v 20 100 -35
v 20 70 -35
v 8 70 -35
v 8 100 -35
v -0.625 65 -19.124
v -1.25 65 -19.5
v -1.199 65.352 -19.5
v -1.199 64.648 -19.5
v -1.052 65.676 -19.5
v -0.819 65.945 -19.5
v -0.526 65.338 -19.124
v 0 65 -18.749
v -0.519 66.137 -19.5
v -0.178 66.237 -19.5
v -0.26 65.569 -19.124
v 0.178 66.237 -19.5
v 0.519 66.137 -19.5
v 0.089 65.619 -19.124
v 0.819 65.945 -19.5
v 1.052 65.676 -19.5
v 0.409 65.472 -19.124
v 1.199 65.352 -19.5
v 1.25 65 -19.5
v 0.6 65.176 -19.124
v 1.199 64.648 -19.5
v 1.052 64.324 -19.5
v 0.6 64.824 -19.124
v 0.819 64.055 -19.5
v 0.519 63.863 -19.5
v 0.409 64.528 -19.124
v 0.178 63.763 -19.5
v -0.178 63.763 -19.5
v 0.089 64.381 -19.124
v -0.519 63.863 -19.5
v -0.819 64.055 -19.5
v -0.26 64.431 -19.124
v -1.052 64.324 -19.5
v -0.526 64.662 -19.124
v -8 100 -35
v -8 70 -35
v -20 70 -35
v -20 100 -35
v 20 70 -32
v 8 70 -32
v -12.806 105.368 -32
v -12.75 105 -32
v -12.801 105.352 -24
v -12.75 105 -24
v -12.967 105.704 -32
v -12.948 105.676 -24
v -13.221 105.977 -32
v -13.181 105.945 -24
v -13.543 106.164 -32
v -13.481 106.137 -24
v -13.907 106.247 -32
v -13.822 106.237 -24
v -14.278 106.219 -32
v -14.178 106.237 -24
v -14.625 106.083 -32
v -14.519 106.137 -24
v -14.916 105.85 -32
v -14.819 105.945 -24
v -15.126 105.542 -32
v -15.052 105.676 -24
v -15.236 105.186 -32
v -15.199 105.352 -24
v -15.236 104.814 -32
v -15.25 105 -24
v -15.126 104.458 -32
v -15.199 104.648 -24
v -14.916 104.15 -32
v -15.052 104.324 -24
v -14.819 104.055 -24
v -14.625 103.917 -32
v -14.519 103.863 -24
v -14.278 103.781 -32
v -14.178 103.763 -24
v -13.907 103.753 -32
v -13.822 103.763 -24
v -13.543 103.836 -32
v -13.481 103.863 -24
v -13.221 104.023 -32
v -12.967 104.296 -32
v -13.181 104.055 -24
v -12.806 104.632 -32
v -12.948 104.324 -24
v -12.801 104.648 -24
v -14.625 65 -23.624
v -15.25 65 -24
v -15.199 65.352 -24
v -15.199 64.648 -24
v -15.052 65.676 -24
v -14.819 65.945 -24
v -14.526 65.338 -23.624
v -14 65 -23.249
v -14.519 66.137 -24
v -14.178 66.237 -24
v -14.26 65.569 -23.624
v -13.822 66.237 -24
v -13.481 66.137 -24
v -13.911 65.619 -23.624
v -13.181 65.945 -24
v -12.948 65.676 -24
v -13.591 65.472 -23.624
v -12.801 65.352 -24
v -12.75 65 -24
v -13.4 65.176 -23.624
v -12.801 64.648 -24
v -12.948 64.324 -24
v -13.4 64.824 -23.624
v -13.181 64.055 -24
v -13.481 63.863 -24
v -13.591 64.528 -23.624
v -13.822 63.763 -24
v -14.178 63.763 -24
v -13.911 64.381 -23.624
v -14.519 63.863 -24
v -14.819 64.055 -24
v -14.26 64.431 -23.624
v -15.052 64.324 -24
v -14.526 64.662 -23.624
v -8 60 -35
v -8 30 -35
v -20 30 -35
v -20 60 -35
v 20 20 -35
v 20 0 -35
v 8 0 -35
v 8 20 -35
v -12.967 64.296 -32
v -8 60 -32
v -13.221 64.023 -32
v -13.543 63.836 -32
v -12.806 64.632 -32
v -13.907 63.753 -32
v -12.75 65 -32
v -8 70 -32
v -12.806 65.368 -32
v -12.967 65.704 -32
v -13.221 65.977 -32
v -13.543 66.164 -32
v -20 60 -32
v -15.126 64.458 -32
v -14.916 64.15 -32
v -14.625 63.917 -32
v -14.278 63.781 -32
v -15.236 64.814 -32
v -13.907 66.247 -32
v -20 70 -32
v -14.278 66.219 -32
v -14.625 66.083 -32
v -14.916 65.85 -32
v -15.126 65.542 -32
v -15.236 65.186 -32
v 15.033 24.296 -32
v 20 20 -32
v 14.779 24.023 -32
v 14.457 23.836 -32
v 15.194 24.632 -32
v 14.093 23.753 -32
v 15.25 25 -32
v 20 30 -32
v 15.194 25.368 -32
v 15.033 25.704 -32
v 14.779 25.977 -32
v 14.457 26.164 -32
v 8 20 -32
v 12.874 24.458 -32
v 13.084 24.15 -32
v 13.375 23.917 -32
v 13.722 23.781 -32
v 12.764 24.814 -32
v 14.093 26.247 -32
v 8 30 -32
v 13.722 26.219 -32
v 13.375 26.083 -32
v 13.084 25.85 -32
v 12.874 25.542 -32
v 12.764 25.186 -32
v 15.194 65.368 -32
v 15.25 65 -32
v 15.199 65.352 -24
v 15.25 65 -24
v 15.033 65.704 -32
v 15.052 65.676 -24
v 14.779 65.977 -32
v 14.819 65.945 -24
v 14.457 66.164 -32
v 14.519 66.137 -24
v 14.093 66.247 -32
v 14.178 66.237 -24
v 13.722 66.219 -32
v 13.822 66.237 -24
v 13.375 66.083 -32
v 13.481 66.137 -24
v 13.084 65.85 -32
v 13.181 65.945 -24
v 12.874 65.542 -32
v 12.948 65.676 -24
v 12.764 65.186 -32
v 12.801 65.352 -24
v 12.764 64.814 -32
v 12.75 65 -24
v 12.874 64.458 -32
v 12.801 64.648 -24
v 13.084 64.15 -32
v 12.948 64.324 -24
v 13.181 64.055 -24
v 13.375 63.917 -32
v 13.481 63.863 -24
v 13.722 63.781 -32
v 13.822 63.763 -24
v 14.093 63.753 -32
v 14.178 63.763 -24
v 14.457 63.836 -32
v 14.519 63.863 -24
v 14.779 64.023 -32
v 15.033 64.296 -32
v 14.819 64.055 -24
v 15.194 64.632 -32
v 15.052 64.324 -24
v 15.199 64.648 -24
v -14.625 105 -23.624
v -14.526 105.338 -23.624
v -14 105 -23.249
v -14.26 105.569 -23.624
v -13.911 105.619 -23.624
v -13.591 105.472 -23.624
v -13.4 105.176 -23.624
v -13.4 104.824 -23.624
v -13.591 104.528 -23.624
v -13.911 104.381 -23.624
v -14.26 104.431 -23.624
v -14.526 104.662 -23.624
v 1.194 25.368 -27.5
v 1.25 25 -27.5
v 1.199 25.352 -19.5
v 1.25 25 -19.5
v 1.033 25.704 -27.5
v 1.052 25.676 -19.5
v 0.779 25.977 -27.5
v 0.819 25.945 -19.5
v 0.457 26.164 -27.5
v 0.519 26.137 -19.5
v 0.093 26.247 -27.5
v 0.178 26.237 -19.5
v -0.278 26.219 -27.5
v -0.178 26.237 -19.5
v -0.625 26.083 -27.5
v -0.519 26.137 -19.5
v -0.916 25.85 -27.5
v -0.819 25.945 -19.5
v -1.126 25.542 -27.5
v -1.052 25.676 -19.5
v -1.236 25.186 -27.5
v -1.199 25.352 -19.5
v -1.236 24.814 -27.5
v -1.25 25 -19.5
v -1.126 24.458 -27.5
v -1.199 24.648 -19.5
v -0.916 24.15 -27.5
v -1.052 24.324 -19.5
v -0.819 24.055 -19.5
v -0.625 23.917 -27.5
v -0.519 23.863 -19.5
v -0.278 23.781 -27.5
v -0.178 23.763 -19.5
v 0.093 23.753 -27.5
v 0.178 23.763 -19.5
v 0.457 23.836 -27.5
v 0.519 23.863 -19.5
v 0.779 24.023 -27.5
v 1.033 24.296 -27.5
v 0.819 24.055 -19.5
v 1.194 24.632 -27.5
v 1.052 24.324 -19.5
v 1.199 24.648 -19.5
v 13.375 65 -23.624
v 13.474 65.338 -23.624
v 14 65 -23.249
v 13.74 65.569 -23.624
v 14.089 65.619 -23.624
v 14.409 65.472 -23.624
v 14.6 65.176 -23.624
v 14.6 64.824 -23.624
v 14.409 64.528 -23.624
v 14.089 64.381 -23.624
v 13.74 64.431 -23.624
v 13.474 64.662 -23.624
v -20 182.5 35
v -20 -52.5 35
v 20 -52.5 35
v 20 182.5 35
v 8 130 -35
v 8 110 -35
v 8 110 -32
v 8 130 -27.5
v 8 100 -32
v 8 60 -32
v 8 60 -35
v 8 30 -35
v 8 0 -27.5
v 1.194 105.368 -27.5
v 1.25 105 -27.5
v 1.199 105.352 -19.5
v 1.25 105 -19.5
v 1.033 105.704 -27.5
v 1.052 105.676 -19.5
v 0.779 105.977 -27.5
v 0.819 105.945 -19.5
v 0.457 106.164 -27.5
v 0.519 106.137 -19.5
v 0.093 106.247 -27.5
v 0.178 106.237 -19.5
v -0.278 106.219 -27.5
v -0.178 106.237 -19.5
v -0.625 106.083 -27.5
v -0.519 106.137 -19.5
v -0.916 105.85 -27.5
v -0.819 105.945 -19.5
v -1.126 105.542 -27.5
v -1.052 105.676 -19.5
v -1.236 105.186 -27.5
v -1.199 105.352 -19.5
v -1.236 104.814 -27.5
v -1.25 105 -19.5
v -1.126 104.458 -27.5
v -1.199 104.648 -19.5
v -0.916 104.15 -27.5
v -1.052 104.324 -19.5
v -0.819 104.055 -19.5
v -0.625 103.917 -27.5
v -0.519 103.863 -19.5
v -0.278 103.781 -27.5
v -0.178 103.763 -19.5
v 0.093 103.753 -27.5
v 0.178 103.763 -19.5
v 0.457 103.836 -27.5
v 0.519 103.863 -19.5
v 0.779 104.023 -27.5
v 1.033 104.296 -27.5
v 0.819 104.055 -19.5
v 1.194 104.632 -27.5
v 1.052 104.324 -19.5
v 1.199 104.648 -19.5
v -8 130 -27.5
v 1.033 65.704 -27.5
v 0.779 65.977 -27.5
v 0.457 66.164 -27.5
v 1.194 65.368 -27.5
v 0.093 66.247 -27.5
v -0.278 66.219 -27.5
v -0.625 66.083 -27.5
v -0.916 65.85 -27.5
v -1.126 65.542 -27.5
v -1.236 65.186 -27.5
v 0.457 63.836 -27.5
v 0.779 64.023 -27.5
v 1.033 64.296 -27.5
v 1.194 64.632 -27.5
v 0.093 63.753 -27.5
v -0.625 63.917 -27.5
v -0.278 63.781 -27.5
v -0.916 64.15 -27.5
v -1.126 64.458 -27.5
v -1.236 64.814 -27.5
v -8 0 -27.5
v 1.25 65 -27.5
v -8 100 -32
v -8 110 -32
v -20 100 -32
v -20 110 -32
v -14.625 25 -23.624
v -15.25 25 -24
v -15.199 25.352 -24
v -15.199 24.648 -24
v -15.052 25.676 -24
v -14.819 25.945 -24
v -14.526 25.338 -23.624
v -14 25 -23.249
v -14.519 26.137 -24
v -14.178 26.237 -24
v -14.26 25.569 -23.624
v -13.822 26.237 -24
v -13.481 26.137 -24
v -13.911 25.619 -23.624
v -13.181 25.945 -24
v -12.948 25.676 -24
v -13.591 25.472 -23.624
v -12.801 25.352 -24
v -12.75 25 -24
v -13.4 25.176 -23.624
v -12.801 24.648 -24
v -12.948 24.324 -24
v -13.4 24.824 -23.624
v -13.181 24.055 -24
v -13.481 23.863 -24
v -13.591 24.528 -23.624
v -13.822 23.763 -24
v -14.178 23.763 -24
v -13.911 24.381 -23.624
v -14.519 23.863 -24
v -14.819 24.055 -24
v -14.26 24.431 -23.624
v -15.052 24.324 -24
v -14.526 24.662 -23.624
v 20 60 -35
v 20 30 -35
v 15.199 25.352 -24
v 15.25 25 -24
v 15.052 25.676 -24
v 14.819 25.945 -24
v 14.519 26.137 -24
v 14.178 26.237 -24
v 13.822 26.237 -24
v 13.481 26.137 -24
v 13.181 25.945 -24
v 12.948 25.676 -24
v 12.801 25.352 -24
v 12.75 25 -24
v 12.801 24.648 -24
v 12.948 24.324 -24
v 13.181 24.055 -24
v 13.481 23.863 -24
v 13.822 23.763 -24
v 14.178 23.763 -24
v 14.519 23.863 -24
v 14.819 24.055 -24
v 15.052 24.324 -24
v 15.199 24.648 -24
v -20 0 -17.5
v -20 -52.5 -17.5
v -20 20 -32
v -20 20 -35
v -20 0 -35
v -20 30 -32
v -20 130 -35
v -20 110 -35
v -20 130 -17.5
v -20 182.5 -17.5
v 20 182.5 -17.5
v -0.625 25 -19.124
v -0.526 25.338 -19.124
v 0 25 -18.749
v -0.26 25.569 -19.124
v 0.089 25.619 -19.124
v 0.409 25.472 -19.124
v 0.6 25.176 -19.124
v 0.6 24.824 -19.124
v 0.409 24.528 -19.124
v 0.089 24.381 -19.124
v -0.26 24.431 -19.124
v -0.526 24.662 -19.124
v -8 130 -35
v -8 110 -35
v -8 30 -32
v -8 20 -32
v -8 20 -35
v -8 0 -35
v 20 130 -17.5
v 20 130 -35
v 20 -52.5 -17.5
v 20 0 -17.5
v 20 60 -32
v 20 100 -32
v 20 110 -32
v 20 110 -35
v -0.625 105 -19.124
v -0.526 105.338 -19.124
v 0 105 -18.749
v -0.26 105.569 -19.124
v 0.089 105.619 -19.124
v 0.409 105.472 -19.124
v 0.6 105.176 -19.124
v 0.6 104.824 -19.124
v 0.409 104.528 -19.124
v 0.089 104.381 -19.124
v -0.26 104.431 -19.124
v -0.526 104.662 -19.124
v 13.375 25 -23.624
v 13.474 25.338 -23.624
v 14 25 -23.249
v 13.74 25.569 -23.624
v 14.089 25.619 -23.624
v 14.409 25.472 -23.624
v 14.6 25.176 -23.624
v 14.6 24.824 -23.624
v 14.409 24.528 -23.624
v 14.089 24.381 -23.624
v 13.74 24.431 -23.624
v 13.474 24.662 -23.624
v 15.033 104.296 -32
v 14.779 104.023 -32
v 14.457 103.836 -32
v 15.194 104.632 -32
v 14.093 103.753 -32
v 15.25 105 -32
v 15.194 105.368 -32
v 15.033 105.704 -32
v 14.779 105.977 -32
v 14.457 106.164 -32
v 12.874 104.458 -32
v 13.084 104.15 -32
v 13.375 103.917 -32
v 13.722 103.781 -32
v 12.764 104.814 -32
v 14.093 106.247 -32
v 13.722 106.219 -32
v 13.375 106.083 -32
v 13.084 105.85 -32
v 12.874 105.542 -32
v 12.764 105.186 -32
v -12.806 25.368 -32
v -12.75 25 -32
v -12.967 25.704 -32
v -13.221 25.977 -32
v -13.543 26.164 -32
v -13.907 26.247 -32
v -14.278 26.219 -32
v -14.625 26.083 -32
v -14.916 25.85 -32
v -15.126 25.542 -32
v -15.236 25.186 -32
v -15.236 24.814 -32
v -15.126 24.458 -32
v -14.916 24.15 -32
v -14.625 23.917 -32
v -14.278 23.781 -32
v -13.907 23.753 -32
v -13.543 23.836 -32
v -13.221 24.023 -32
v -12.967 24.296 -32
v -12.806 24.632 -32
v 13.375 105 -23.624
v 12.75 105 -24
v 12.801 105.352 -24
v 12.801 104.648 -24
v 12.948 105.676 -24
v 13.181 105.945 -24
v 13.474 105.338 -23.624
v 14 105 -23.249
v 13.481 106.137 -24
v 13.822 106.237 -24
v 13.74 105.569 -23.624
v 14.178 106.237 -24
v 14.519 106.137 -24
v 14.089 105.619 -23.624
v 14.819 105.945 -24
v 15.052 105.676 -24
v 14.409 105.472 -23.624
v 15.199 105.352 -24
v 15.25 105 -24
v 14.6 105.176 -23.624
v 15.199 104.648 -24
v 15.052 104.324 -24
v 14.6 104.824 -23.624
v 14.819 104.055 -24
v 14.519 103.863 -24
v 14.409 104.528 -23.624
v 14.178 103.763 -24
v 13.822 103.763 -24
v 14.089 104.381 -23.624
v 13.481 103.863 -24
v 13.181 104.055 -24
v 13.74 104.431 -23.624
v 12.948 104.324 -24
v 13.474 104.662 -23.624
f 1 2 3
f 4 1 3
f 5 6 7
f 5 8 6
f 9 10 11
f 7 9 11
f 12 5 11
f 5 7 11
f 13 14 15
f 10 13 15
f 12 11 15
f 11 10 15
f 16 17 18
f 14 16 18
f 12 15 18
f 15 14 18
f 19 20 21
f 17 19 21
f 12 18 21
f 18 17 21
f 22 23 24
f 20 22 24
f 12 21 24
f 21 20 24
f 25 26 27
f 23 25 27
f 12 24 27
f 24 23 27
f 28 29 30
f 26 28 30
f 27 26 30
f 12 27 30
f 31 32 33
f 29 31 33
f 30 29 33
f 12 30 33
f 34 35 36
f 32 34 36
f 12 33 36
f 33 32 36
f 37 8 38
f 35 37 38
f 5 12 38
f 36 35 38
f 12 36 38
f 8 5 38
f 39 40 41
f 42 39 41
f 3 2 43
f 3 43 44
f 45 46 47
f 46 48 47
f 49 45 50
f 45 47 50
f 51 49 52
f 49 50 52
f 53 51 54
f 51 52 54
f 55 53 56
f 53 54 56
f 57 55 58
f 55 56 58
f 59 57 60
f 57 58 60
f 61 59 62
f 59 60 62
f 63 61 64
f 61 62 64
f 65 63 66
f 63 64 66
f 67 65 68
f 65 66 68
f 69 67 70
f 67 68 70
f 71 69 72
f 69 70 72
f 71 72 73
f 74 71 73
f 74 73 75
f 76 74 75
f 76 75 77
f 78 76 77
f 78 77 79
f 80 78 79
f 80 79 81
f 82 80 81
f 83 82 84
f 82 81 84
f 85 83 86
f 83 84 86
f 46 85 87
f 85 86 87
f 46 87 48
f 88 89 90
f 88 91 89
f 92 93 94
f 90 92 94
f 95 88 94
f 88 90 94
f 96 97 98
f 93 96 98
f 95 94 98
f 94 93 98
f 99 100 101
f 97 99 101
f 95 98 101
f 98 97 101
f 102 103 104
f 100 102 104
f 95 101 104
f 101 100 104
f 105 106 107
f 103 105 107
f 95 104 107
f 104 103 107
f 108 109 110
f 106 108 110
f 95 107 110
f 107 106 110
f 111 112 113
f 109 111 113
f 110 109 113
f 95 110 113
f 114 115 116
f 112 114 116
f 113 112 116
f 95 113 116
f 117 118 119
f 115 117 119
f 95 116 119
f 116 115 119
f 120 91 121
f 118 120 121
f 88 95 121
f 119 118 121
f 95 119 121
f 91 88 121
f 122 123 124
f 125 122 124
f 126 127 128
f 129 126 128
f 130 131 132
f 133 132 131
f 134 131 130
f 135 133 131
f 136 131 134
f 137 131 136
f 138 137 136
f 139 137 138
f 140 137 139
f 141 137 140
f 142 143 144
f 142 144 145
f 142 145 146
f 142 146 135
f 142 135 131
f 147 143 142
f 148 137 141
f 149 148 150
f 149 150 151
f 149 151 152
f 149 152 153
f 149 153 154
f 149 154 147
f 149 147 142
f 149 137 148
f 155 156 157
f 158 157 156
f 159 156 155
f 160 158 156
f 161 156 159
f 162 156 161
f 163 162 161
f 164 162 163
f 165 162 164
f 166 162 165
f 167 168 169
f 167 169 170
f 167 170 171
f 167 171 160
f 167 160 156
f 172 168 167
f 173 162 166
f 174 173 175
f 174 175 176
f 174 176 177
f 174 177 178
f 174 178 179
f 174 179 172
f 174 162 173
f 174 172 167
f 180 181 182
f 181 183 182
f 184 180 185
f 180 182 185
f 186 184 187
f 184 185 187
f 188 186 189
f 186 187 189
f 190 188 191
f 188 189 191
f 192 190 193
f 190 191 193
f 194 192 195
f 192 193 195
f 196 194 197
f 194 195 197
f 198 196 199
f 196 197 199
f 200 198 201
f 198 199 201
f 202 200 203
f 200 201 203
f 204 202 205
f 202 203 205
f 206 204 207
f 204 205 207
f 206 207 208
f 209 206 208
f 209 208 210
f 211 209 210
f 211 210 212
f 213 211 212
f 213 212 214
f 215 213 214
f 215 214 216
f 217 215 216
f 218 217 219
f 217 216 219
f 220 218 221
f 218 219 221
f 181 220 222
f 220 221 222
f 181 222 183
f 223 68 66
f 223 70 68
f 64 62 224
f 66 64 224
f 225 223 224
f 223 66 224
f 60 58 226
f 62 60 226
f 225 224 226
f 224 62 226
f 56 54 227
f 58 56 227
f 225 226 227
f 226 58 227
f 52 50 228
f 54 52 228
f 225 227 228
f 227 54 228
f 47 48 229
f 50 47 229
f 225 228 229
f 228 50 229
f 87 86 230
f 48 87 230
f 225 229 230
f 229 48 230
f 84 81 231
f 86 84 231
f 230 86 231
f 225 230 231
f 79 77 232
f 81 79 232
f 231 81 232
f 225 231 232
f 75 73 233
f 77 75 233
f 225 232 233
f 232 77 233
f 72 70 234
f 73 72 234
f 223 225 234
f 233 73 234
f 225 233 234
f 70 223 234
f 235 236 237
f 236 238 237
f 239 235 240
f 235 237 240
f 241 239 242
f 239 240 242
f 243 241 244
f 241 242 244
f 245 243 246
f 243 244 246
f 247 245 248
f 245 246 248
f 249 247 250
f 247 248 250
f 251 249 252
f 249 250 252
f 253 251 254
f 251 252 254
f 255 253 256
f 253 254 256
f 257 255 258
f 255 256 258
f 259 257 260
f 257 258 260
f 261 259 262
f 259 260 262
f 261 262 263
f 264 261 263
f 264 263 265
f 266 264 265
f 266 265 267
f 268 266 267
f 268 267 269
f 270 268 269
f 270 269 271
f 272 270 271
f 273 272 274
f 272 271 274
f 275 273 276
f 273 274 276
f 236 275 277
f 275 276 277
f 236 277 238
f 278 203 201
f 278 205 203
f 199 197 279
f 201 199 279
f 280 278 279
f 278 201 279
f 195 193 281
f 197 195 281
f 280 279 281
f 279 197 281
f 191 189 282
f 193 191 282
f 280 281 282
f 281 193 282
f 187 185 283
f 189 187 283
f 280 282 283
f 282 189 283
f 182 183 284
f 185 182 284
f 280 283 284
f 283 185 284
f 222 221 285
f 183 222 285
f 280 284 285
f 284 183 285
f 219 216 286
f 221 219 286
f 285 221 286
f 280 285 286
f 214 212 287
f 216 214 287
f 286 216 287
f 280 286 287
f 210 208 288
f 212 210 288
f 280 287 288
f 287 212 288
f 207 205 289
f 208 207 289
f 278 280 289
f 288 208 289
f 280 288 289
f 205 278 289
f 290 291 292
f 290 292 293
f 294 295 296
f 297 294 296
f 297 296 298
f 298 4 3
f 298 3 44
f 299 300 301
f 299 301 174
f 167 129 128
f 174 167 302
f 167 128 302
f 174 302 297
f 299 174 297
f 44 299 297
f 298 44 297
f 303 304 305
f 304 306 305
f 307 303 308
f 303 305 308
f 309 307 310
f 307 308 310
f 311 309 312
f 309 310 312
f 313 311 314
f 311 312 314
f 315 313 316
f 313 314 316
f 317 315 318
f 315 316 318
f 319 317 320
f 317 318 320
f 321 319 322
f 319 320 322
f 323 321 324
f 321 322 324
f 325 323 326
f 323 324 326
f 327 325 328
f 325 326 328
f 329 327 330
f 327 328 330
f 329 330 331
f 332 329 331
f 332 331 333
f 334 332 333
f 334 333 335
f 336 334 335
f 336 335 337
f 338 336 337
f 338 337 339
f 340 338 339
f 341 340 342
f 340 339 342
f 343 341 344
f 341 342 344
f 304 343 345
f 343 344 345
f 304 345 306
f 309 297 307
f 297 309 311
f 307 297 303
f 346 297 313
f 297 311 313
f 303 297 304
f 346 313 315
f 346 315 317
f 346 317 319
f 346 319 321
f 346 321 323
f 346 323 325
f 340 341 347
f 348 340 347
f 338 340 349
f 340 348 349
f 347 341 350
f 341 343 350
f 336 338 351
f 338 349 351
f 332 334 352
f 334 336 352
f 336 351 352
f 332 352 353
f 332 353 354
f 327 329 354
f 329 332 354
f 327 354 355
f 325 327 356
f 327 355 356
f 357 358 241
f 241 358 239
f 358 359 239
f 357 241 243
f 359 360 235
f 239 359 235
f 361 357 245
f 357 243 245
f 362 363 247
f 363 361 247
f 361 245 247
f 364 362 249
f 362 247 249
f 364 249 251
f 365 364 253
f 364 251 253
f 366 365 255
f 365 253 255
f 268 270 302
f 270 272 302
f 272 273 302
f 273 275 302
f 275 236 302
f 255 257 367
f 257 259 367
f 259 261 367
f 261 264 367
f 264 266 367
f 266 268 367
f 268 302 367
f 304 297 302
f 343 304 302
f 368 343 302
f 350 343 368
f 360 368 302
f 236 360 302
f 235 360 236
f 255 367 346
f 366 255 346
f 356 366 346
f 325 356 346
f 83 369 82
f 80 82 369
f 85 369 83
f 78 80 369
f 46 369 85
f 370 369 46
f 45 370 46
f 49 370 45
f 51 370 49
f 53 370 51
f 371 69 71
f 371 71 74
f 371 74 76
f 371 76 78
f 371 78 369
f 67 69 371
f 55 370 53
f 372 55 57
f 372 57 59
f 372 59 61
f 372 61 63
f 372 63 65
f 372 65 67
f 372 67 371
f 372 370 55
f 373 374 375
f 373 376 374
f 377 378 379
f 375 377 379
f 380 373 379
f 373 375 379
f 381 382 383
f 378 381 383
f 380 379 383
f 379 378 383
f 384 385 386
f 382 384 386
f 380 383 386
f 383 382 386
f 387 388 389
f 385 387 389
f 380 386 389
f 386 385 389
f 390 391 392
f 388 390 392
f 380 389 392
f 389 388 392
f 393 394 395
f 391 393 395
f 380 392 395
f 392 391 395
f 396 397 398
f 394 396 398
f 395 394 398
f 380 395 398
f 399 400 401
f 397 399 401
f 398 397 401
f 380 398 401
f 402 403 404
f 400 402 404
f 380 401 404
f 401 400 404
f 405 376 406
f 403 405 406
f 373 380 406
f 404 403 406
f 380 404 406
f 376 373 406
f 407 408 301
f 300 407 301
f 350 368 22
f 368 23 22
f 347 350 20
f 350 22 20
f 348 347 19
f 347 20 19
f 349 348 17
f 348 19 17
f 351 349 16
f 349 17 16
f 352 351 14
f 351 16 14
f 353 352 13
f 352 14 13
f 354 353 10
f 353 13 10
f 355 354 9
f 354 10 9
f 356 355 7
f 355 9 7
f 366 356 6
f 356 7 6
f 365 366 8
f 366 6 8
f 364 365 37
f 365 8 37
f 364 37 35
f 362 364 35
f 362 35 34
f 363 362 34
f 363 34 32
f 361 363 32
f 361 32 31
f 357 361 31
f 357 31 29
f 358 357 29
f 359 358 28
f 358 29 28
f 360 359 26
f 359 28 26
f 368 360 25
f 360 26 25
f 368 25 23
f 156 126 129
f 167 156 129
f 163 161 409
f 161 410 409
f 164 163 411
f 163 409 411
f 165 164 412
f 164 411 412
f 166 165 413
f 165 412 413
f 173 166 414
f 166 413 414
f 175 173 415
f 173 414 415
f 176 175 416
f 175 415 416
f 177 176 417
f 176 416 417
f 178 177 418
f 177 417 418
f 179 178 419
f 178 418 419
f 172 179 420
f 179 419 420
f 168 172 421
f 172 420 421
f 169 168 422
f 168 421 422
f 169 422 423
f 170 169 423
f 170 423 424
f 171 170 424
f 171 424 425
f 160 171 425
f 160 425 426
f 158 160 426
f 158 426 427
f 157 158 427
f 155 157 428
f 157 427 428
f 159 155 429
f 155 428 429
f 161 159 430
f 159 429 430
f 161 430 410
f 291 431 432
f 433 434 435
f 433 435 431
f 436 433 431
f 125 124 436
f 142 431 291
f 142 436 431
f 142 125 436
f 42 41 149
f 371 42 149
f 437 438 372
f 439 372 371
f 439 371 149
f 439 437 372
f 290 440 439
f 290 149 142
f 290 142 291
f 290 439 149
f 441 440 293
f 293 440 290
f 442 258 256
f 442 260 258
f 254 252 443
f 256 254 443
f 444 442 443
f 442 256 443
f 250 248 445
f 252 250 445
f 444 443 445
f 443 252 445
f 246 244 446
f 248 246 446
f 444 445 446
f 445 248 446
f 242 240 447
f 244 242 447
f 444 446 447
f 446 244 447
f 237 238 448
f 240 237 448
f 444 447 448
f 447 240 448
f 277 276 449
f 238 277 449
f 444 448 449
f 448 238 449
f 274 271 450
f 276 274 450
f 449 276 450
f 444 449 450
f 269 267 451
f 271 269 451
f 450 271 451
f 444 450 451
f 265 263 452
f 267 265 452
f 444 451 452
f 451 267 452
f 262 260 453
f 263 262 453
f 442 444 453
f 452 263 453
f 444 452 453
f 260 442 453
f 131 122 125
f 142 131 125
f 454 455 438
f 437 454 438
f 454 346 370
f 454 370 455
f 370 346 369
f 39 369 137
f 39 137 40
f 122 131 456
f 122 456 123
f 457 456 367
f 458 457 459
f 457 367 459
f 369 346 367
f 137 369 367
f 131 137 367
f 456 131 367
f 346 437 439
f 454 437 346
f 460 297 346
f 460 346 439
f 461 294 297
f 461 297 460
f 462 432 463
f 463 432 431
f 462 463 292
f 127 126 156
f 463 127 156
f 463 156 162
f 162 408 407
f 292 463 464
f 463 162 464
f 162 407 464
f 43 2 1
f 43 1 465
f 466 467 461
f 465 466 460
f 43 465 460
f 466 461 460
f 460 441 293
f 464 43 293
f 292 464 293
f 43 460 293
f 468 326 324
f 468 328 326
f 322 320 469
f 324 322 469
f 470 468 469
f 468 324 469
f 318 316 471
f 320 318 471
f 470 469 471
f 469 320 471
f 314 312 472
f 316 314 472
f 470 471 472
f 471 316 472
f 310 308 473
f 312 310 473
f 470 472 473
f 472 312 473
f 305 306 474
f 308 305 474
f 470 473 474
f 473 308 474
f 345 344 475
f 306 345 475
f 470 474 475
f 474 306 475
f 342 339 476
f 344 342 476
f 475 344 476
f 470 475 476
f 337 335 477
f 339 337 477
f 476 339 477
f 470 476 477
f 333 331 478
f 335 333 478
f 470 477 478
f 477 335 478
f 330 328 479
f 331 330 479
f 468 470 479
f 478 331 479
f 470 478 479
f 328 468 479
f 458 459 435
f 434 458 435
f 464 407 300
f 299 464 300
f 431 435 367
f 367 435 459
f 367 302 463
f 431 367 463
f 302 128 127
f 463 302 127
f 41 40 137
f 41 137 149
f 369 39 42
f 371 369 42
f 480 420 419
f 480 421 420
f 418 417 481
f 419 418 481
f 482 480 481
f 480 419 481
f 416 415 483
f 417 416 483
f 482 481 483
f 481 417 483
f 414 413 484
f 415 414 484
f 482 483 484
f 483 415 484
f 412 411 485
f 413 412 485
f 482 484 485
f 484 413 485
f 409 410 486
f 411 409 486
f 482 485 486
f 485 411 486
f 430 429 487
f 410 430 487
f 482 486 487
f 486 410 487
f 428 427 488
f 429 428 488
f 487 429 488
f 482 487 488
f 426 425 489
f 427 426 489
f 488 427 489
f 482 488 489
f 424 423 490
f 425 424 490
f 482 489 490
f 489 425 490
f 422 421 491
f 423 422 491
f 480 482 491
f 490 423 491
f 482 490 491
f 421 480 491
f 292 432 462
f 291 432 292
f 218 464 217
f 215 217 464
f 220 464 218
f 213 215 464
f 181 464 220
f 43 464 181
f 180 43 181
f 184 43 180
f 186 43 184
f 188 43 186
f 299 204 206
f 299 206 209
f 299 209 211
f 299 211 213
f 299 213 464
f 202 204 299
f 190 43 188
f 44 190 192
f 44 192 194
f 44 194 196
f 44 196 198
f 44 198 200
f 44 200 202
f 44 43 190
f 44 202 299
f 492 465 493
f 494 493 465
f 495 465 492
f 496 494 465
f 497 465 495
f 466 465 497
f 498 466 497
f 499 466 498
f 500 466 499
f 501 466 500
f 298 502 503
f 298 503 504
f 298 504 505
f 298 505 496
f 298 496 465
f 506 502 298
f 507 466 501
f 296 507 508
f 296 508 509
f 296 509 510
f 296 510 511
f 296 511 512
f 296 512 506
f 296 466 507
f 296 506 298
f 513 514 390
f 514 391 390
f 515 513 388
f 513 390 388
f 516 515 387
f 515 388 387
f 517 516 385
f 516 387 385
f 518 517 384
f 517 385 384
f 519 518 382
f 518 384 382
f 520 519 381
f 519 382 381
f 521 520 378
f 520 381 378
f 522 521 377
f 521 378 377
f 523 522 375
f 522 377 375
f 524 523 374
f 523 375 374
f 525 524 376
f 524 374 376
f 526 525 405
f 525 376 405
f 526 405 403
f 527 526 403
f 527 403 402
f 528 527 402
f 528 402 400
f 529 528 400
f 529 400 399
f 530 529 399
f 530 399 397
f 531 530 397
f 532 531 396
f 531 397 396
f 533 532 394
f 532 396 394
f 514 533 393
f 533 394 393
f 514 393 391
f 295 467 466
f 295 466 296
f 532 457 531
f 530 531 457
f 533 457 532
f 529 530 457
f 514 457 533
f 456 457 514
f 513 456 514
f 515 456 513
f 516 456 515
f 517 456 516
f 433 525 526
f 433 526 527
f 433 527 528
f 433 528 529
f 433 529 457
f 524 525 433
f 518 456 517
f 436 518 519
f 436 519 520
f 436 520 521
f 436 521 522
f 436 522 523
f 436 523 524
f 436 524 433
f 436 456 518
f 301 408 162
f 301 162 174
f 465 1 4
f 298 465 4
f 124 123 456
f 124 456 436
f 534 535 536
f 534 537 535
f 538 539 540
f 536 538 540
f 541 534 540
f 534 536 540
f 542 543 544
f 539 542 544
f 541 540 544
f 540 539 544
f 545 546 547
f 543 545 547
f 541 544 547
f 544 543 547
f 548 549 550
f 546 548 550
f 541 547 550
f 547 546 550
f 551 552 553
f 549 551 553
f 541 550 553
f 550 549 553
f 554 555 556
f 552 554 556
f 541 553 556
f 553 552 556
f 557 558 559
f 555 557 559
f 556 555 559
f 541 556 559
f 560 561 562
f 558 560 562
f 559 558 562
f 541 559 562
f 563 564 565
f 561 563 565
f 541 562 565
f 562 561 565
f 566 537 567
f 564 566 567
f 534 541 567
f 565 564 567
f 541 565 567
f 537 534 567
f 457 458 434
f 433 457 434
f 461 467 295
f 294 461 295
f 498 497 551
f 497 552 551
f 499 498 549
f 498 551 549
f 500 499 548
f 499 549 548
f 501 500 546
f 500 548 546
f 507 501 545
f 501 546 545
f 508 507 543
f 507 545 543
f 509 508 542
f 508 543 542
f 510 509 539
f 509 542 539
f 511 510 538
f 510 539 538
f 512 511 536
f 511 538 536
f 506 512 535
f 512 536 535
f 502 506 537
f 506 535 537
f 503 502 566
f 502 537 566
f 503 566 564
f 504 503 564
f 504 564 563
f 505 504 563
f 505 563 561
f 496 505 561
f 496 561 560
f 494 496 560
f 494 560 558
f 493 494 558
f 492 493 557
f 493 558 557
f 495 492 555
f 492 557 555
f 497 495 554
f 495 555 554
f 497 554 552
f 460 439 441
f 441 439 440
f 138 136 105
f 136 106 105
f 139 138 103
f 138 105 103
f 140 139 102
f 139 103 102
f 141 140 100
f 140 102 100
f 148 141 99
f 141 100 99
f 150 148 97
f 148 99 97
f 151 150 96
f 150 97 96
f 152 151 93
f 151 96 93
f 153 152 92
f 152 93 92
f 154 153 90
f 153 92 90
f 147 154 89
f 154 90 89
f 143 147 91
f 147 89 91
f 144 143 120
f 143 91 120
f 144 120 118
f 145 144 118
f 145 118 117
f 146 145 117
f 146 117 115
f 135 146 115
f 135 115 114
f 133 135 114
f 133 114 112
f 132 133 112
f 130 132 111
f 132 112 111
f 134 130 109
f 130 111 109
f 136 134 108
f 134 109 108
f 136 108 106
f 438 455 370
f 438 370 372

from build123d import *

# Parameters (mm, degrees)
BOSS_EXTRUDE1_DEPTH   = 130
SKETCH2_W             = 40
SKETCH2_H             = 10
CUT_EXTRUDE1_DEPTH    = 3
M3_TAPPED_HOLE1_D     = 2.5
M3_TAPPED_HOLE1_DEPTH = 8
M3_TAPPED_HOLE1_TIP   = 0.751075774
M3_TAPPED_HOLE2_D     = 2.5
M3_TAPPED_HOLE2_DEPTH = 8
M3_TAPPED_HOLE2_TIP   = 0.751075774
SKETCH9_W             = 52.5
SKETCH9_H             = 52.5
BOSS_EXTRUDE2_DEPTH   = 40


with BuildPart() as part:
    # Sketch1 → Boss-Extrude1 (new body)
    with BuildSketch(Plane(origin=(0, 0, 0), x_dir=(1, 0, 0), z_dir=(0, 1, 0))):
        Polygon((-20, 35), (-20, -35), (20, -35), (20, 35), (8, 35), (8, 27.5), (-8, 27.5), (-8, 35), align=None)
    extrude(amount=BOSS_EXTRUDE1_DEPTH)

    # Sketch2 → Cut-Extrude1 (cut)
    with BuildSketch(Plane(origin=(0, 0, -35), x_dir=(-1, 0, 0), z_dir=(0, 0, -1))):
        with Locations((0, 25)):
            Rectangle(SKETCH2_W, SKETCH2_H)
        with Locations((0, 65)):
            Rectangle(SKETCH2_W, SKETCH2_H)
        with Locations((0, 105)):
            Rectangle(SKETCH2_W, SKETCH2_H)
    extrude(amount=-CUT_EXTRUDE1_DEPTH, mode=Mode.SUBTRACT)

    # M3 Tapped Hole1
    with Locations(Plane(origin=(-14, 25, -32), x_dir=(-1, 0, 0), z_dir=(0, 0, -1))):
        with Locations((0, 0), (-28, 0), (0, 80), (-28, 80), (0, 40), (-28, 40)):
            Hole(M3_TAPPED_HOLE1_D / 2, depth=M3_TAPPED_HOLE1_DEPTH)
            with Locations((0, 0, -(M3_TAPPED_HOLE1_DEPTH + M3_TAPPED_HOLE1_TIP / 2))):  # 118° drill point
                Cone(0, M3_TAPPED_HOLE1_D / 2, M3_TAPPED_HOLE1_TIP, mode=Mode.SUBTRACT)

    # M3 Tapped Hole2
    with Locations(Plane(origin=(0, 25, -27.5), x_dir=(-1, 0, 0), z_dir=(0, 0, -1))):
        with Locations((0, 0), (0, 40), (0, 80)):
            Hole(M3_TAPPED_HOLE2_D / 2, depth=M3_TAPPED_HOLE2_DEPTH)
            with Locations((0, 0, -(M3_TAPPED_HOLE2_DEPTH + M3_TAPPED_HOLE2_TIP / 2))):  # 118° drill point
                Cone(0, M3_TAPPED_HOLE2_D / 2, M3_TAPPED_HOLE2_TIP, mode=Mode.SUBTRACT)

    # Sketch9 → Boss-Extrude2 (add)
    with BuildSketch(Plane.ZY.offset(20)):
        with Locations((8.75, -26.25)):
            Rectangle(SKETCH9_W, SKETCH9_H)
        with Locations((8.75, 156.25)):
            Rectangle(SKETCH9_W, SKETCH9_H)
    extrude(amount=-BOSS_EXTRUDE2_DEPTH)


solid = part.part
